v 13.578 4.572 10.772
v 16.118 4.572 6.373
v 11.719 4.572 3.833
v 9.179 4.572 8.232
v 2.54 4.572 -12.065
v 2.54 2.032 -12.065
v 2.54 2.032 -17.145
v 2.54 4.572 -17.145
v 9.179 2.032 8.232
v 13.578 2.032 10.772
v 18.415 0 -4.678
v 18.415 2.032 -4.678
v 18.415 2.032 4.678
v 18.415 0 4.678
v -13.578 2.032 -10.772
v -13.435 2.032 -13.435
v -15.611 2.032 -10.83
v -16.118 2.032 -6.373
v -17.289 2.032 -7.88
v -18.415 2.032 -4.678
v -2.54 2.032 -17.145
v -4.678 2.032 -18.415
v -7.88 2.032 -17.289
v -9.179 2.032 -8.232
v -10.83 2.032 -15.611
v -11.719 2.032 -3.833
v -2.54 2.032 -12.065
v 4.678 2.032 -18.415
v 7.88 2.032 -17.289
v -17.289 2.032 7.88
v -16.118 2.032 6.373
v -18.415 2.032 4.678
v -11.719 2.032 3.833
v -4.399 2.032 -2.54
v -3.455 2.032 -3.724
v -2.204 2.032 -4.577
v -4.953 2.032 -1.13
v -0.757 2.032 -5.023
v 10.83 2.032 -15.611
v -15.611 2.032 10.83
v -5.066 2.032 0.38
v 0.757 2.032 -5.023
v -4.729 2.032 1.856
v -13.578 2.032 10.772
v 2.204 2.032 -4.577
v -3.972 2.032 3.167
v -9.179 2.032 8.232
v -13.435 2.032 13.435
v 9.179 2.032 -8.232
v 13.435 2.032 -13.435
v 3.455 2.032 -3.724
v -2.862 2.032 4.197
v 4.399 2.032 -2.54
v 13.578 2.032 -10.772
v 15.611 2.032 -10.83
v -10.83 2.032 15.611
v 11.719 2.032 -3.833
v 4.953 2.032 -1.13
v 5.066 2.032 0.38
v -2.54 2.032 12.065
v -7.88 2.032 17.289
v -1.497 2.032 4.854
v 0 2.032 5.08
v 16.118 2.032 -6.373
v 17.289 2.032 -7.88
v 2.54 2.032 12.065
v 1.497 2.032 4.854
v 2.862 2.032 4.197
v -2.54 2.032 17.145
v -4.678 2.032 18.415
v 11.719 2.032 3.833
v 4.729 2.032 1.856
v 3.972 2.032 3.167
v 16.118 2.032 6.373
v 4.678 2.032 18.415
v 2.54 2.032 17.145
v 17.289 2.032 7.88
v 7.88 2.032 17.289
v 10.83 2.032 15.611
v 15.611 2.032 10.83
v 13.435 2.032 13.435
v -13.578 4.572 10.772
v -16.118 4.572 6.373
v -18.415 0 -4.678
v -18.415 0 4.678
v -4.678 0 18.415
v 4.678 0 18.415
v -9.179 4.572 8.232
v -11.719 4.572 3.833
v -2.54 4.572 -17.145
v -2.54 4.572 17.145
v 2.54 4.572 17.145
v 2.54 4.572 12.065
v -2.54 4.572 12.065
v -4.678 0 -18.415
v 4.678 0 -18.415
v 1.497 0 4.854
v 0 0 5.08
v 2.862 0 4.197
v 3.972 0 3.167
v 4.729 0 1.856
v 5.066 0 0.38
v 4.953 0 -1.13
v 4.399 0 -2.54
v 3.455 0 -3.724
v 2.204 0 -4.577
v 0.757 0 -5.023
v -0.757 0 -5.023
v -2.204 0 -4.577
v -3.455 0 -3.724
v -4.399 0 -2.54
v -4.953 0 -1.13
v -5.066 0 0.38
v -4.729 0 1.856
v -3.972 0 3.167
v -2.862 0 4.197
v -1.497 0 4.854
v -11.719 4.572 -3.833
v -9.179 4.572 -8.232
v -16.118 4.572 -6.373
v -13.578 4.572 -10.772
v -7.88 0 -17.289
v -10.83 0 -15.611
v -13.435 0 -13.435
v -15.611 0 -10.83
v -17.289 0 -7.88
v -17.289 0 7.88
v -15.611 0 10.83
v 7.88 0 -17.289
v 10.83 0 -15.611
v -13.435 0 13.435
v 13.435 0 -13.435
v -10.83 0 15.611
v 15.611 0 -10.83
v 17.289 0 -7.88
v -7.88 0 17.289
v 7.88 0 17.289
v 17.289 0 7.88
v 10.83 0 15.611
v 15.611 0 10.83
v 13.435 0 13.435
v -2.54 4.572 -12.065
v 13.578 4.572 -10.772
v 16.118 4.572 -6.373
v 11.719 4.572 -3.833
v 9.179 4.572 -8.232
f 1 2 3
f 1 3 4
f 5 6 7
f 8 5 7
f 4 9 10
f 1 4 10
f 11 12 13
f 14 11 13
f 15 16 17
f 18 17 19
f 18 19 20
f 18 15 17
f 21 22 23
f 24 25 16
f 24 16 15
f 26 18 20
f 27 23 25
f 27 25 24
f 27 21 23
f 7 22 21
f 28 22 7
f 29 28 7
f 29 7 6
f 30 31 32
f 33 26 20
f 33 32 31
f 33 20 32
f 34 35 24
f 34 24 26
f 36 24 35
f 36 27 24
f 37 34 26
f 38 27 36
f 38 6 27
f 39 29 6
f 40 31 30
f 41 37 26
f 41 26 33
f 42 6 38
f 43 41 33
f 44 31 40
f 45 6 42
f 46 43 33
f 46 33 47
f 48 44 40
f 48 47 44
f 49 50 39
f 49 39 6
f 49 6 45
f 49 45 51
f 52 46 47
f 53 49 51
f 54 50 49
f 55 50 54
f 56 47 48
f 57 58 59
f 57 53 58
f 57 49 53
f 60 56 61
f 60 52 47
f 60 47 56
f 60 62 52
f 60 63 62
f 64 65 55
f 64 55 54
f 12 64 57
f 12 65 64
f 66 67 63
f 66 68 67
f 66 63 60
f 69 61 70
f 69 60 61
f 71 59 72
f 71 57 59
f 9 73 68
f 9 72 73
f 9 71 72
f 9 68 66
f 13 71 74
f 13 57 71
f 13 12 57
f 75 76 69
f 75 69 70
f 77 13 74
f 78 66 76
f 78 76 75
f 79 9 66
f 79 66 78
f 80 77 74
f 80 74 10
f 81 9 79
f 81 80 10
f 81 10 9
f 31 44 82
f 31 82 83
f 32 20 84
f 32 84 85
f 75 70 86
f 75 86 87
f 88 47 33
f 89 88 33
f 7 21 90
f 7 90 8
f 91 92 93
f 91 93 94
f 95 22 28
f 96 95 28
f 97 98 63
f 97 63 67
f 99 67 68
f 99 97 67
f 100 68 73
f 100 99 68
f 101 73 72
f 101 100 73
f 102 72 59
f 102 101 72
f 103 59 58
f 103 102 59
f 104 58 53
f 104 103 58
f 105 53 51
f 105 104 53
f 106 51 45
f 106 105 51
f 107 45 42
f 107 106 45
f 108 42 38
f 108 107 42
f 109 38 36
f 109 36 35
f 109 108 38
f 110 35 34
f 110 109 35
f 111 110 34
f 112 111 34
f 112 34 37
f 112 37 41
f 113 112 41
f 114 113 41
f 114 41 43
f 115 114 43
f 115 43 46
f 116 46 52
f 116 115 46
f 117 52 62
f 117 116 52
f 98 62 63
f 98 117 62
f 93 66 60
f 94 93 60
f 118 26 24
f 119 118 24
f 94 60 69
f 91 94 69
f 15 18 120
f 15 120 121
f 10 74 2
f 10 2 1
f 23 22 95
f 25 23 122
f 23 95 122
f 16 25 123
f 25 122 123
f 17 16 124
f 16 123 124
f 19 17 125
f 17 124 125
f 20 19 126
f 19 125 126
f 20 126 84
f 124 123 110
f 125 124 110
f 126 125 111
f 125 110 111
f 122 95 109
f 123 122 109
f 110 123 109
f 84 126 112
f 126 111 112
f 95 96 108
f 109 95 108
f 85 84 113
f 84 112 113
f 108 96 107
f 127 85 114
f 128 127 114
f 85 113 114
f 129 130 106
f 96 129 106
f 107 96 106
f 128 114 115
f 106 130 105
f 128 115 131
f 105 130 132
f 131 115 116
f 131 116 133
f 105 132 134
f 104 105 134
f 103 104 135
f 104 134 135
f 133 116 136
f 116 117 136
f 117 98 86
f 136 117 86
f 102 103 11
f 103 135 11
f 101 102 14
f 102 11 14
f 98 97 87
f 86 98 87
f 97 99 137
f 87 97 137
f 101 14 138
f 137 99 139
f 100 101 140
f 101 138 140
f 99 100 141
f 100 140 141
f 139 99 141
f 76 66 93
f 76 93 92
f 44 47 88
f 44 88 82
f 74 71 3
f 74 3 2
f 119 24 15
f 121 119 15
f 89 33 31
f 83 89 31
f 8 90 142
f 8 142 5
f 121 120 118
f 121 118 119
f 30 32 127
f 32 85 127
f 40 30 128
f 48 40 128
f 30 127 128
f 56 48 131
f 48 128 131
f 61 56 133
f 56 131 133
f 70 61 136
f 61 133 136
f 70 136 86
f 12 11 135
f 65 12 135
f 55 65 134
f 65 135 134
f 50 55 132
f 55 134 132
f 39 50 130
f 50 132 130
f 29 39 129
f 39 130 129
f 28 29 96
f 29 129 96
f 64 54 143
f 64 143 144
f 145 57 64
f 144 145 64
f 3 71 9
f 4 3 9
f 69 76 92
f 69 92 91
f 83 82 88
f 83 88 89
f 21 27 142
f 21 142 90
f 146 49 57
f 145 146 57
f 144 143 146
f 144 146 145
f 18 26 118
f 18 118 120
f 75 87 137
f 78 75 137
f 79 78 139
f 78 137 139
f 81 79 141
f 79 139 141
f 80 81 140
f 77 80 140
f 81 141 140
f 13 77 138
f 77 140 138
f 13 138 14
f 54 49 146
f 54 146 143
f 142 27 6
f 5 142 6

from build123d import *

# Parameters (mm, degrees)
SKETCH1_R           = 19
SKETCH1_R_2         = 5.08
BOSS_EXTRUDE1_DEPTH = 2.032
CUT_EXTRUDE1_DEPTH  = 27.946781329
CIRPATTERN1_COUNT   = 2
CIRPATTERN1_ANGLE   = 90
SKETCH3_W           = 5.08
SKETCH3_H           = 5.08
BOSS_EXTRUDE2_DEPTH = 2.54
CIRPATTERN2_COUNT   = 6


with BuildPart() as part:
    # Sketch1 → Boss-Extrude1 (new body)
    with BuildSketch(Plane(origin=(0, 0, 0), x_dir=(1, 0, 0), z_dir=(0, 1, 0))):
        with Locations(Location((0, 0, 0), (0, 0, 270))):
            Circle(SKETCH1_R)
        with Locations(Location((0, 0, 0), (0, 0, 270))):
            Circle(SKETCH1_R_2, mode=Mode.SUBTRACT)
    extrude(amount=BOSS_EXTRUDE1_DEPTH)

    # Sketch2 → Cut-Extrude1 (cut, through all)
    with BuildSketch(Plane(origin=(0, 2.032, 0), x_dir=(1, 0, 0), z_dir=(0, 1, 0))):
        with BuildLine():
            Line((-4.678437239, 18.415), (4.678437239, 18.415))
            ThreePointArc((4.678437239, 18.415), (0, 19), (-4.678437239, 18.415))
        make_face()
        with BuildLine():
            Line((-4.678437239, -18.415), (4.678437239, -18.415))
            ThreePointArc((4.678437239, -18.415), (0, -19), (-4.678437239, -18.415))
        make_face()
    cut_extrude1 = extrude(amount=-CUT_EXTRUDE1_DEPTH, mode=Mode.SUBTRACT)

    # CirPattern1: Cut-Extrude1 ×2 about axis
    cirpattern1_axis = Axis((0, 2.032, 0), (0, -1, 0))
    for i in range(1, CIRPATTERN1_COUNT):
        add(cut_extrude1.rotate(cirpattern1_axis, i * CIRPATTERN1_ANGLE / (CIRPATTERN1_COUNT - 1)), mode=Mode.SUBTRACT)

    # Sketch3 → Boss-Extrude2 (add)
    with BuildSketch(Plane(origin=(0, 2.032, 0), x_dir=(1, 0, 0), z_dir=(0, 1, 0))):
        with Locations((0, 14.605)):
            Rectangle(SKETCH3_W, SKETCH3_H)
    boss_extrude2 = extrude(amount=BOSS_EXTRUDE2_DEPTH)

    # CirPattern2: Boss-Extrude2 ×6 about axis
    cirpattern2_axis = Axis((0, 0, 0), (0, 1, 0))
    for i in range(1, CIRPATTERN2_COUNT):
        add(boss_extrude2.rotate(cirpattern2_axis, i * 360 / CIRPATTERN2_COUNT))


solid = part.part
